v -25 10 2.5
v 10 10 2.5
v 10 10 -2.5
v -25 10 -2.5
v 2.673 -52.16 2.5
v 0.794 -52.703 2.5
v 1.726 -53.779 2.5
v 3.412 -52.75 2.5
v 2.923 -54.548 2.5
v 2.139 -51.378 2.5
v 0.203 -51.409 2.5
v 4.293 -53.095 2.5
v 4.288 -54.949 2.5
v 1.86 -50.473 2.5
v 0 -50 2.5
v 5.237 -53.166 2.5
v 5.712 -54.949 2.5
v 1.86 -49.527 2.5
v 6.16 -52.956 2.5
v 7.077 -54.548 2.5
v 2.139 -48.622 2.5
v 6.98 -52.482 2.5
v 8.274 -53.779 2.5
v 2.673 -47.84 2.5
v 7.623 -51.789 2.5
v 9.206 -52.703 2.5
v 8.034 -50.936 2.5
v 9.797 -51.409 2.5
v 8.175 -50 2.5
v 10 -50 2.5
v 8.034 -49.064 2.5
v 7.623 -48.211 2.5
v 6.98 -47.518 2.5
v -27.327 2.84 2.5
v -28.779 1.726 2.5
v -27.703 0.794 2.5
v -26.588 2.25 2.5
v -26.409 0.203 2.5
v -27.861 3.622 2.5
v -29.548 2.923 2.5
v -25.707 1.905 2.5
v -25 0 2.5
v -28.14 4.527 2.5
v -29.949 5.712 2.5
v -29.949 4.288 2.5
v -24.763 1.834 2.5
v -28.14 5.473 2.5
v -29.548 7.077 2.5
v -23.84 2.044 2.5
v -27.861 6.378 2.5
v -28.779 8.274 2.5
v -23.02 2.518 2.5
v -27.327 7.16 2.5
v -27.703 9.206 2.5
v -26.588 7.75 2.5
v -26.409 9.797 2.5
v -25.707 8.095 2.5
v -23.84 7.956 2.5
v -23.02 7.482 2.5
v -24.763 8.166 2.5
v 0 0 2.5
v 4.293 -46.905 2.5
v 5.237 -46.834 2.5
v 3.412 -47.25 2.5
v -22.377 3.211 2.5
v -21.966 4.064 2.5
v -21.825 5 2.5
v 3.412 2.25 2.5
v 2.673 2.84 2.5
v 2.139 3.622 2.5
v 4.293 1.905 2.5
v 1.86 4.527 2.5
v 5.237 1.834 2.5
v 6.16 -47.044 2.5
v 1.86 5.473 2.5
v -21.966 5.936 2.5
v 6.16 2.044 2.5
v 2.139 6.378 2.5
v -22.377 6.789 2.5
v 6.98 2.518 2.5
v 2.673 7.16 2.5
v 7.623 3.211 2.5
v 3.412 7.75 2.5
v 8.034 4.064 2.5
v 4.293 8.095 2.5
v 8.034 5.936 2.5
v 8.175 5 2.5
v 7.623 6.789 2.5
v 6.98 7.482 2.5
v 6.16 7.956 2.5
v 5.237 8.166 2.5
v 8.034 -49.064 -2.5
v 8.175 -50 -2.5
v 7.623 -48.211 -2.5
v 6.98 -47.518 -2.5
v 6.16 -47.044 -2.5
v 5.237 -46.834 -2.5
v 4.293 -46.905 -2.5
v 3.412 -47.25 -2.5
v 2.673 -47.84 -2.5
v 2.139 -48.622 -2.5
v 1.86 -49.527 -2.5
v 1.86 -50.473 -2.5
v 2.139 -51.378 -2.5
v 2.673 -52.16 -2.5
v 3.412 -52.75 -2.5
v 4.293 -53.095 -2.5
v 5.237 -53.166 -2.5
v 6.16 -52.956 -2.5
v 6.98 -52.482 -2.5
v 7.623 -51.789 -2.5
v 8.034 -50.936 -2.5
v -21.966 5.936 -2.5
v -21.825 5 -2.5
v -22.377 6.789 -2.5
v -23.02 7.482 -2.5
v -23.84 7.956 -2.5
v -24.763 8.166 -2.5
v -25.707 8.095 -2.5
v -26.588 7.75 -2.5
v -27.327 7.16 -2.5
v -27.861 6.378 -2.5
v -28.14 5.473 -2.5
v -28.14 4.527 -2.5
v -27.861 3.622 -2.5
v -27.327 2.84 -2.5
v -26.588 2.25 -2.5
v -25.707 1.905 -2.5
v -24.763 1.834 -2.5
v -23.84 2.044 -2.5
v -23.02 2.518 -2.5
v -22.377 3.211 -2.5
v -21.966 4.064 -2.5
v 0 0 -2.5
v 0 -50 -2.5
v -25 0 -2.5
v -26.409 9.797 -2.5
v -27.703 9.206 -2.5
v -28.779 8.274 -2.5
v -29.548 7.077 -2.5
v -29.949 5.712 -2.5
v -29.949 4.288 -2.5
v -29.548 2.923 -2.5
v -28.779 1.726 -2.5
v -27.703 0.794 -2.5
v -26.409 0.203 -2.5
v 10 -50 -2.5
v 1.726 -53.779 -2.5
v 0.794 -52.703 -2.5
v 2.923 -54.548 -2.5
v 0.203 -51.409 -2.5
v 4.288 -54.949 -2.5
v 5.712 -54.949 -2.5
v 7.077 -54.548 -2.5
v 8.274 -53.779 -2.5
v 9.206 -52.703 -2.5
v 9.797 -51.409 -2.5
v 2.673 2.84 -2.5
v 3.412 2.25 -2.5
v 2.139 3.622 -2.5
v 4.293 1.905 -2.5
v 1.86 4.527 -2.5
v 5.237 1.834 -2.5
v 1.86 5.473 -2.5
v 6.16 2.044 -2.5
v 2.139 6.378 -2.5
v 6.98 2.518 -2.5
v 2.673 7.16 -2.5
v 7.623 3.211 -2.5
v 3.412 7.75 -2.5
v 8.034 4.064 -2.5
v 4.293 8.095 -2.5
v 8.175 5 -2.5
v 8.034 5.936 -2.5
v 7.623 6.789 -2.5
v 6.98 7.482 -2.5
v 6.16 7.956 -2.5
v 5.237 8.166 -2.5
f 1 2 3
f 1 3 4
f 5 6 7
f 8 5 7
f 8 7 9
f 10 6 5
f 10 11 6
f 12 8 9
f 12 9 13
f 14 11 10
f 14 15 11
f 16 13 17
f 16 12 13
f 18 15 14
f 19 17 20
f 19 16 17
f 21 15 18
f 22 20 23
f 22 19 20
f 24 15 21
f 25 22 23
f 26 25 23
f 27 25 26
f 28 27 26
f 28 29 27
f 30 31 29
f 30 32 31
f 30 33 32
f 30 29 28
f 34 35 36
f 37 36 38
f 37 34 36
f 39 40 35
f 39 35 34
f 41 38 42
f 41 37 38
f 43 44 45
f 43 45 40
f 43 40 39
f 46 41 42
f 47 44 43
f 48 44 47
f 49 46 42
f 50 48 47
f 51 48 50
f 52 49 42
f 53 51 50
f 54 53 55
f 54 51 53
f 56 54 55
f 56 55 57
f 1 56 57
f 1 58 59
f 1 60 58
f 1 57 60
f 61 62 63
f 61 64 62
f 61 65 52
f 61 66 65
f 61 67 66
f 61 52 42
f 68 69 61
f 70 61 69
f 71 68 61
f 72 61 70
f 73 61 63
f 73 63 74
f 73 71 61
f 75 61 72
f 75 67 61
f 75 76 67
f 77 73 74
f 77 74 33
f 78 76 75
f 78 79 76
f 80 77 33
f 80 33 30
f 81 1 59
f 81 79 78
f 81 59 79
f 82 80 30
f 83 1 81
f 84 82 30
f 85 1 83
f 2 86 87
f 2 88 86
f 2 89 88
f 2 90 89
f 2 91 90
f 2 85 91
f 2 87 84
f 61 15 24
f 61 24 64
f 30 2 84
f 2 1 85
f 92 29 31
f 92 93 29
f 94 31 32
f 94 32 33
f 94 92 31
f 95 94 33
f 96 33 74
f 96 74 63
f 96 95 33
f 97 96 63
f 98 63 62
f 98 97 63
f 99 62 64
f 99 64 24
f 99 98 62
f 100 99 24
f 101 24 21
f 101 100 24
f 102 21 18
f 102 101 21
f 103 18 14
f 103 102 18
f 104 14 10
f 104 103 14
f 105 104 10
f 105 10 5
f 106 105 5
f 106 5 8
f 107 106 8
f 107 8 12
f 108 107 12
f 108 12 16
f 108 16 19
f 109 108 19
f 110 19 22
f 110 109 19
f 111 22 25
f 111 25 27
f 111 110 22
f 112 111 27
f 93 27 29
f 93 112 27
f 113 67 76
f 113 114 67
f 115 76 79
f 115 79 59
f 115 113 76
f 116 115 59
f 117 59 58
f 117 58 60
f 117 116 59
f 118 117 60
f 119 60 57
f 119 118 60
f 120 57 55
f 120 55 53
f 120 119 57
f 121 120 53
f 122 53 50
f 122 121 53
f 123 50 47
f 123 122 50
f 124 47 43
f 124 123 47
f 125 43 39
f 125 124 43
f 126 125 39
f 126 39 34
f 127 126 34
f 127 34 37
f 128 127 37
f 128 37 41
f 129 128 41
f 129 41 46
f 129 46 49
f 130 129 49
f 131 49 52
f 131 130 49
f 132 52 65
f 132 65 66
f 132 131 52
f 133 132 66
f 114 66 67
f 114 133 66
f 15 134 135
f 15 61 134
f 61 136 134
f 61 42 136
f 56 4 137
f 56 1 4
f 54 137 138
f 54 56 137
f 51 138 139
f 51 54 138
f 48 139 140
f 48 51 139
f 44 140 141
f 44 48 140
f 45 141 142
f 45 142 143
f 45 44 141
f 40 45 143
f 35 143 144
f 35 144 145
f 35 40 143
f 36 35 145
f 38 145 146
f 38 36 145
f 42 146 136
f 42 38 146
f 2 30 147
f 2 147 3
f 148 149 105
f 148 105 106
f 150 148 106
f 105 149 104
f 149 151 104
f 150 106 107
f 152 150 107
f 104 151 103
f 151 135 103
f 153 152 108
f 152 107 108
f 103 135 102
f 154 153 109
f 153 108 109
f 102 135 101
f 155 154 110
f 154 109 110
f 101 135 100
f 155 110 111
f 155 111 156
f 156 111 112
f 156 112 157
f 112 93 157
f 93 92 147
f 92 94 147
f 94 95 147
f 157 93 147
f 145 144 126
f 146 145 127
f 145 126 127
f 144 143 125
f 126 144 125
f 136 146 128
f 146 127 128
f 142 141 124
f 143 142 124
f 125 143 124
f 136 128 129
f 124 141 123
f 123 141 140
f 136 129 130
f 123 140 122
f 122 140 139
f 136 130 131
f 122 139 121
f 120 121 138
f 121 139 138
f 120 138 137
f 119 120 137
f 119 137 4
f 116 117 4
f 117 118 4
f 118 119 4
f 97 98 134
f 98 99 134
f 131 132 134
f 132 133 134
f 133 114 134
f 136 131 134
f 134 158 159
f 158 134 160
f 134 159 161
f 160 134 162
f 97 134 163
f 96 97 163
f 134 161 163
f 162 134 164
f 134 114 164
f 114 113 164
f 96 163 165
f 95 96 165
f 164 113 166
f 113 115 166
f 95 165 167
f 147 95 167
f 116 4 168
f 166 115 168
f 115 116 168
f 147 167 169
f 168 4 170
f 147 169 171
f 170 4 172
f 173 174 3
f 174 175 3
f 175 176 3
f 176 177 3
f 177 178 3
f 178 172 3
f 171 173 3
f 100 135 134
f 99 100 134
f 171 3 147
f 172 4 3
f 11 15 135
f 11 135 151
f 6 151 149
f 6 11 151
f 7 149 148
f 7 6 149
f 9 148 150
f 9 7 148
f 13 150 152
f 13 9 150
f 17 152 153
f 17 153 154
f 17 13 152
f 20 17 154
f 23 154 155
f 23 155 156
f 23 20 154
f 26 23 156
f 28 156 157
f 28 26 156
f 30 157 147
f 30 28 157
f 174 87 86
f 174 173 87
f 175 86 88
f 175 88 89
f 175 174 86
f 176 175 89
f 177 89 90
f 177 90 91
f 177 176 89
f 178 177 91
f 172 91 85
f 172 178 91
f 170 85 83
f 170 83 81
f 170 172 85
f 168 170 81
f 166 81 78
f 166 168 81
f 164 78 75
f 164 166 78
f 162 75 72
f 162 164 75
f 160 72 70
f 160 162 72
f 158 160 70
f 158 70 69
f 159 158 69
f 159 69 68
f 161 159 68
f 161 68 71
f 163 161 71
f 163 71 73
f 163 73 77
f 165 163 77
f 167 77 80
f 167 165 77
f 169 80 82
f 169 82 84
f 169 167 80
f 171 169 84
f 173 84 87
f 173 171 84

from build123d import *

# Parameters (mm, degrees)
CROQUIS1_R              = 3.175
SALIENTE_EXTRUIR1_DEPTH = 2.5


with BuildPart() as part:
    # Croquis1 → Saliente-Extruir1 (new, symmetric)
    with BuildSketch(Plane.XY):
        with BuildLine():
            Line((0, 0), (0, -50))
            ThreePointArc((0, -50), (5, -55), (10, -50))
            Line((10, -50), (10, 10))
            Line((10, 10), (-25, 10))
            ThreePointArc((-25, 10), (-30, 5), (-25, 0))
            Line((-25, 0), (0, 0))
        make_face()
        with Locations((5, -50)):
            Circle(CROQUIS1_R, mode=Mode.SUBTRACT)
        with Locations((5, 5)):
            Circle(CROQUIS1_R, mode=Mode.SUBTRACT)
        with Locations((-25, 5)):
            Circle(CROQUIS1_R, mode=Mode.SUBTRACT)
    extrude(amount=SALIENTE_EXTRUIR1_DEPTH, both=True)


solid = part.part
